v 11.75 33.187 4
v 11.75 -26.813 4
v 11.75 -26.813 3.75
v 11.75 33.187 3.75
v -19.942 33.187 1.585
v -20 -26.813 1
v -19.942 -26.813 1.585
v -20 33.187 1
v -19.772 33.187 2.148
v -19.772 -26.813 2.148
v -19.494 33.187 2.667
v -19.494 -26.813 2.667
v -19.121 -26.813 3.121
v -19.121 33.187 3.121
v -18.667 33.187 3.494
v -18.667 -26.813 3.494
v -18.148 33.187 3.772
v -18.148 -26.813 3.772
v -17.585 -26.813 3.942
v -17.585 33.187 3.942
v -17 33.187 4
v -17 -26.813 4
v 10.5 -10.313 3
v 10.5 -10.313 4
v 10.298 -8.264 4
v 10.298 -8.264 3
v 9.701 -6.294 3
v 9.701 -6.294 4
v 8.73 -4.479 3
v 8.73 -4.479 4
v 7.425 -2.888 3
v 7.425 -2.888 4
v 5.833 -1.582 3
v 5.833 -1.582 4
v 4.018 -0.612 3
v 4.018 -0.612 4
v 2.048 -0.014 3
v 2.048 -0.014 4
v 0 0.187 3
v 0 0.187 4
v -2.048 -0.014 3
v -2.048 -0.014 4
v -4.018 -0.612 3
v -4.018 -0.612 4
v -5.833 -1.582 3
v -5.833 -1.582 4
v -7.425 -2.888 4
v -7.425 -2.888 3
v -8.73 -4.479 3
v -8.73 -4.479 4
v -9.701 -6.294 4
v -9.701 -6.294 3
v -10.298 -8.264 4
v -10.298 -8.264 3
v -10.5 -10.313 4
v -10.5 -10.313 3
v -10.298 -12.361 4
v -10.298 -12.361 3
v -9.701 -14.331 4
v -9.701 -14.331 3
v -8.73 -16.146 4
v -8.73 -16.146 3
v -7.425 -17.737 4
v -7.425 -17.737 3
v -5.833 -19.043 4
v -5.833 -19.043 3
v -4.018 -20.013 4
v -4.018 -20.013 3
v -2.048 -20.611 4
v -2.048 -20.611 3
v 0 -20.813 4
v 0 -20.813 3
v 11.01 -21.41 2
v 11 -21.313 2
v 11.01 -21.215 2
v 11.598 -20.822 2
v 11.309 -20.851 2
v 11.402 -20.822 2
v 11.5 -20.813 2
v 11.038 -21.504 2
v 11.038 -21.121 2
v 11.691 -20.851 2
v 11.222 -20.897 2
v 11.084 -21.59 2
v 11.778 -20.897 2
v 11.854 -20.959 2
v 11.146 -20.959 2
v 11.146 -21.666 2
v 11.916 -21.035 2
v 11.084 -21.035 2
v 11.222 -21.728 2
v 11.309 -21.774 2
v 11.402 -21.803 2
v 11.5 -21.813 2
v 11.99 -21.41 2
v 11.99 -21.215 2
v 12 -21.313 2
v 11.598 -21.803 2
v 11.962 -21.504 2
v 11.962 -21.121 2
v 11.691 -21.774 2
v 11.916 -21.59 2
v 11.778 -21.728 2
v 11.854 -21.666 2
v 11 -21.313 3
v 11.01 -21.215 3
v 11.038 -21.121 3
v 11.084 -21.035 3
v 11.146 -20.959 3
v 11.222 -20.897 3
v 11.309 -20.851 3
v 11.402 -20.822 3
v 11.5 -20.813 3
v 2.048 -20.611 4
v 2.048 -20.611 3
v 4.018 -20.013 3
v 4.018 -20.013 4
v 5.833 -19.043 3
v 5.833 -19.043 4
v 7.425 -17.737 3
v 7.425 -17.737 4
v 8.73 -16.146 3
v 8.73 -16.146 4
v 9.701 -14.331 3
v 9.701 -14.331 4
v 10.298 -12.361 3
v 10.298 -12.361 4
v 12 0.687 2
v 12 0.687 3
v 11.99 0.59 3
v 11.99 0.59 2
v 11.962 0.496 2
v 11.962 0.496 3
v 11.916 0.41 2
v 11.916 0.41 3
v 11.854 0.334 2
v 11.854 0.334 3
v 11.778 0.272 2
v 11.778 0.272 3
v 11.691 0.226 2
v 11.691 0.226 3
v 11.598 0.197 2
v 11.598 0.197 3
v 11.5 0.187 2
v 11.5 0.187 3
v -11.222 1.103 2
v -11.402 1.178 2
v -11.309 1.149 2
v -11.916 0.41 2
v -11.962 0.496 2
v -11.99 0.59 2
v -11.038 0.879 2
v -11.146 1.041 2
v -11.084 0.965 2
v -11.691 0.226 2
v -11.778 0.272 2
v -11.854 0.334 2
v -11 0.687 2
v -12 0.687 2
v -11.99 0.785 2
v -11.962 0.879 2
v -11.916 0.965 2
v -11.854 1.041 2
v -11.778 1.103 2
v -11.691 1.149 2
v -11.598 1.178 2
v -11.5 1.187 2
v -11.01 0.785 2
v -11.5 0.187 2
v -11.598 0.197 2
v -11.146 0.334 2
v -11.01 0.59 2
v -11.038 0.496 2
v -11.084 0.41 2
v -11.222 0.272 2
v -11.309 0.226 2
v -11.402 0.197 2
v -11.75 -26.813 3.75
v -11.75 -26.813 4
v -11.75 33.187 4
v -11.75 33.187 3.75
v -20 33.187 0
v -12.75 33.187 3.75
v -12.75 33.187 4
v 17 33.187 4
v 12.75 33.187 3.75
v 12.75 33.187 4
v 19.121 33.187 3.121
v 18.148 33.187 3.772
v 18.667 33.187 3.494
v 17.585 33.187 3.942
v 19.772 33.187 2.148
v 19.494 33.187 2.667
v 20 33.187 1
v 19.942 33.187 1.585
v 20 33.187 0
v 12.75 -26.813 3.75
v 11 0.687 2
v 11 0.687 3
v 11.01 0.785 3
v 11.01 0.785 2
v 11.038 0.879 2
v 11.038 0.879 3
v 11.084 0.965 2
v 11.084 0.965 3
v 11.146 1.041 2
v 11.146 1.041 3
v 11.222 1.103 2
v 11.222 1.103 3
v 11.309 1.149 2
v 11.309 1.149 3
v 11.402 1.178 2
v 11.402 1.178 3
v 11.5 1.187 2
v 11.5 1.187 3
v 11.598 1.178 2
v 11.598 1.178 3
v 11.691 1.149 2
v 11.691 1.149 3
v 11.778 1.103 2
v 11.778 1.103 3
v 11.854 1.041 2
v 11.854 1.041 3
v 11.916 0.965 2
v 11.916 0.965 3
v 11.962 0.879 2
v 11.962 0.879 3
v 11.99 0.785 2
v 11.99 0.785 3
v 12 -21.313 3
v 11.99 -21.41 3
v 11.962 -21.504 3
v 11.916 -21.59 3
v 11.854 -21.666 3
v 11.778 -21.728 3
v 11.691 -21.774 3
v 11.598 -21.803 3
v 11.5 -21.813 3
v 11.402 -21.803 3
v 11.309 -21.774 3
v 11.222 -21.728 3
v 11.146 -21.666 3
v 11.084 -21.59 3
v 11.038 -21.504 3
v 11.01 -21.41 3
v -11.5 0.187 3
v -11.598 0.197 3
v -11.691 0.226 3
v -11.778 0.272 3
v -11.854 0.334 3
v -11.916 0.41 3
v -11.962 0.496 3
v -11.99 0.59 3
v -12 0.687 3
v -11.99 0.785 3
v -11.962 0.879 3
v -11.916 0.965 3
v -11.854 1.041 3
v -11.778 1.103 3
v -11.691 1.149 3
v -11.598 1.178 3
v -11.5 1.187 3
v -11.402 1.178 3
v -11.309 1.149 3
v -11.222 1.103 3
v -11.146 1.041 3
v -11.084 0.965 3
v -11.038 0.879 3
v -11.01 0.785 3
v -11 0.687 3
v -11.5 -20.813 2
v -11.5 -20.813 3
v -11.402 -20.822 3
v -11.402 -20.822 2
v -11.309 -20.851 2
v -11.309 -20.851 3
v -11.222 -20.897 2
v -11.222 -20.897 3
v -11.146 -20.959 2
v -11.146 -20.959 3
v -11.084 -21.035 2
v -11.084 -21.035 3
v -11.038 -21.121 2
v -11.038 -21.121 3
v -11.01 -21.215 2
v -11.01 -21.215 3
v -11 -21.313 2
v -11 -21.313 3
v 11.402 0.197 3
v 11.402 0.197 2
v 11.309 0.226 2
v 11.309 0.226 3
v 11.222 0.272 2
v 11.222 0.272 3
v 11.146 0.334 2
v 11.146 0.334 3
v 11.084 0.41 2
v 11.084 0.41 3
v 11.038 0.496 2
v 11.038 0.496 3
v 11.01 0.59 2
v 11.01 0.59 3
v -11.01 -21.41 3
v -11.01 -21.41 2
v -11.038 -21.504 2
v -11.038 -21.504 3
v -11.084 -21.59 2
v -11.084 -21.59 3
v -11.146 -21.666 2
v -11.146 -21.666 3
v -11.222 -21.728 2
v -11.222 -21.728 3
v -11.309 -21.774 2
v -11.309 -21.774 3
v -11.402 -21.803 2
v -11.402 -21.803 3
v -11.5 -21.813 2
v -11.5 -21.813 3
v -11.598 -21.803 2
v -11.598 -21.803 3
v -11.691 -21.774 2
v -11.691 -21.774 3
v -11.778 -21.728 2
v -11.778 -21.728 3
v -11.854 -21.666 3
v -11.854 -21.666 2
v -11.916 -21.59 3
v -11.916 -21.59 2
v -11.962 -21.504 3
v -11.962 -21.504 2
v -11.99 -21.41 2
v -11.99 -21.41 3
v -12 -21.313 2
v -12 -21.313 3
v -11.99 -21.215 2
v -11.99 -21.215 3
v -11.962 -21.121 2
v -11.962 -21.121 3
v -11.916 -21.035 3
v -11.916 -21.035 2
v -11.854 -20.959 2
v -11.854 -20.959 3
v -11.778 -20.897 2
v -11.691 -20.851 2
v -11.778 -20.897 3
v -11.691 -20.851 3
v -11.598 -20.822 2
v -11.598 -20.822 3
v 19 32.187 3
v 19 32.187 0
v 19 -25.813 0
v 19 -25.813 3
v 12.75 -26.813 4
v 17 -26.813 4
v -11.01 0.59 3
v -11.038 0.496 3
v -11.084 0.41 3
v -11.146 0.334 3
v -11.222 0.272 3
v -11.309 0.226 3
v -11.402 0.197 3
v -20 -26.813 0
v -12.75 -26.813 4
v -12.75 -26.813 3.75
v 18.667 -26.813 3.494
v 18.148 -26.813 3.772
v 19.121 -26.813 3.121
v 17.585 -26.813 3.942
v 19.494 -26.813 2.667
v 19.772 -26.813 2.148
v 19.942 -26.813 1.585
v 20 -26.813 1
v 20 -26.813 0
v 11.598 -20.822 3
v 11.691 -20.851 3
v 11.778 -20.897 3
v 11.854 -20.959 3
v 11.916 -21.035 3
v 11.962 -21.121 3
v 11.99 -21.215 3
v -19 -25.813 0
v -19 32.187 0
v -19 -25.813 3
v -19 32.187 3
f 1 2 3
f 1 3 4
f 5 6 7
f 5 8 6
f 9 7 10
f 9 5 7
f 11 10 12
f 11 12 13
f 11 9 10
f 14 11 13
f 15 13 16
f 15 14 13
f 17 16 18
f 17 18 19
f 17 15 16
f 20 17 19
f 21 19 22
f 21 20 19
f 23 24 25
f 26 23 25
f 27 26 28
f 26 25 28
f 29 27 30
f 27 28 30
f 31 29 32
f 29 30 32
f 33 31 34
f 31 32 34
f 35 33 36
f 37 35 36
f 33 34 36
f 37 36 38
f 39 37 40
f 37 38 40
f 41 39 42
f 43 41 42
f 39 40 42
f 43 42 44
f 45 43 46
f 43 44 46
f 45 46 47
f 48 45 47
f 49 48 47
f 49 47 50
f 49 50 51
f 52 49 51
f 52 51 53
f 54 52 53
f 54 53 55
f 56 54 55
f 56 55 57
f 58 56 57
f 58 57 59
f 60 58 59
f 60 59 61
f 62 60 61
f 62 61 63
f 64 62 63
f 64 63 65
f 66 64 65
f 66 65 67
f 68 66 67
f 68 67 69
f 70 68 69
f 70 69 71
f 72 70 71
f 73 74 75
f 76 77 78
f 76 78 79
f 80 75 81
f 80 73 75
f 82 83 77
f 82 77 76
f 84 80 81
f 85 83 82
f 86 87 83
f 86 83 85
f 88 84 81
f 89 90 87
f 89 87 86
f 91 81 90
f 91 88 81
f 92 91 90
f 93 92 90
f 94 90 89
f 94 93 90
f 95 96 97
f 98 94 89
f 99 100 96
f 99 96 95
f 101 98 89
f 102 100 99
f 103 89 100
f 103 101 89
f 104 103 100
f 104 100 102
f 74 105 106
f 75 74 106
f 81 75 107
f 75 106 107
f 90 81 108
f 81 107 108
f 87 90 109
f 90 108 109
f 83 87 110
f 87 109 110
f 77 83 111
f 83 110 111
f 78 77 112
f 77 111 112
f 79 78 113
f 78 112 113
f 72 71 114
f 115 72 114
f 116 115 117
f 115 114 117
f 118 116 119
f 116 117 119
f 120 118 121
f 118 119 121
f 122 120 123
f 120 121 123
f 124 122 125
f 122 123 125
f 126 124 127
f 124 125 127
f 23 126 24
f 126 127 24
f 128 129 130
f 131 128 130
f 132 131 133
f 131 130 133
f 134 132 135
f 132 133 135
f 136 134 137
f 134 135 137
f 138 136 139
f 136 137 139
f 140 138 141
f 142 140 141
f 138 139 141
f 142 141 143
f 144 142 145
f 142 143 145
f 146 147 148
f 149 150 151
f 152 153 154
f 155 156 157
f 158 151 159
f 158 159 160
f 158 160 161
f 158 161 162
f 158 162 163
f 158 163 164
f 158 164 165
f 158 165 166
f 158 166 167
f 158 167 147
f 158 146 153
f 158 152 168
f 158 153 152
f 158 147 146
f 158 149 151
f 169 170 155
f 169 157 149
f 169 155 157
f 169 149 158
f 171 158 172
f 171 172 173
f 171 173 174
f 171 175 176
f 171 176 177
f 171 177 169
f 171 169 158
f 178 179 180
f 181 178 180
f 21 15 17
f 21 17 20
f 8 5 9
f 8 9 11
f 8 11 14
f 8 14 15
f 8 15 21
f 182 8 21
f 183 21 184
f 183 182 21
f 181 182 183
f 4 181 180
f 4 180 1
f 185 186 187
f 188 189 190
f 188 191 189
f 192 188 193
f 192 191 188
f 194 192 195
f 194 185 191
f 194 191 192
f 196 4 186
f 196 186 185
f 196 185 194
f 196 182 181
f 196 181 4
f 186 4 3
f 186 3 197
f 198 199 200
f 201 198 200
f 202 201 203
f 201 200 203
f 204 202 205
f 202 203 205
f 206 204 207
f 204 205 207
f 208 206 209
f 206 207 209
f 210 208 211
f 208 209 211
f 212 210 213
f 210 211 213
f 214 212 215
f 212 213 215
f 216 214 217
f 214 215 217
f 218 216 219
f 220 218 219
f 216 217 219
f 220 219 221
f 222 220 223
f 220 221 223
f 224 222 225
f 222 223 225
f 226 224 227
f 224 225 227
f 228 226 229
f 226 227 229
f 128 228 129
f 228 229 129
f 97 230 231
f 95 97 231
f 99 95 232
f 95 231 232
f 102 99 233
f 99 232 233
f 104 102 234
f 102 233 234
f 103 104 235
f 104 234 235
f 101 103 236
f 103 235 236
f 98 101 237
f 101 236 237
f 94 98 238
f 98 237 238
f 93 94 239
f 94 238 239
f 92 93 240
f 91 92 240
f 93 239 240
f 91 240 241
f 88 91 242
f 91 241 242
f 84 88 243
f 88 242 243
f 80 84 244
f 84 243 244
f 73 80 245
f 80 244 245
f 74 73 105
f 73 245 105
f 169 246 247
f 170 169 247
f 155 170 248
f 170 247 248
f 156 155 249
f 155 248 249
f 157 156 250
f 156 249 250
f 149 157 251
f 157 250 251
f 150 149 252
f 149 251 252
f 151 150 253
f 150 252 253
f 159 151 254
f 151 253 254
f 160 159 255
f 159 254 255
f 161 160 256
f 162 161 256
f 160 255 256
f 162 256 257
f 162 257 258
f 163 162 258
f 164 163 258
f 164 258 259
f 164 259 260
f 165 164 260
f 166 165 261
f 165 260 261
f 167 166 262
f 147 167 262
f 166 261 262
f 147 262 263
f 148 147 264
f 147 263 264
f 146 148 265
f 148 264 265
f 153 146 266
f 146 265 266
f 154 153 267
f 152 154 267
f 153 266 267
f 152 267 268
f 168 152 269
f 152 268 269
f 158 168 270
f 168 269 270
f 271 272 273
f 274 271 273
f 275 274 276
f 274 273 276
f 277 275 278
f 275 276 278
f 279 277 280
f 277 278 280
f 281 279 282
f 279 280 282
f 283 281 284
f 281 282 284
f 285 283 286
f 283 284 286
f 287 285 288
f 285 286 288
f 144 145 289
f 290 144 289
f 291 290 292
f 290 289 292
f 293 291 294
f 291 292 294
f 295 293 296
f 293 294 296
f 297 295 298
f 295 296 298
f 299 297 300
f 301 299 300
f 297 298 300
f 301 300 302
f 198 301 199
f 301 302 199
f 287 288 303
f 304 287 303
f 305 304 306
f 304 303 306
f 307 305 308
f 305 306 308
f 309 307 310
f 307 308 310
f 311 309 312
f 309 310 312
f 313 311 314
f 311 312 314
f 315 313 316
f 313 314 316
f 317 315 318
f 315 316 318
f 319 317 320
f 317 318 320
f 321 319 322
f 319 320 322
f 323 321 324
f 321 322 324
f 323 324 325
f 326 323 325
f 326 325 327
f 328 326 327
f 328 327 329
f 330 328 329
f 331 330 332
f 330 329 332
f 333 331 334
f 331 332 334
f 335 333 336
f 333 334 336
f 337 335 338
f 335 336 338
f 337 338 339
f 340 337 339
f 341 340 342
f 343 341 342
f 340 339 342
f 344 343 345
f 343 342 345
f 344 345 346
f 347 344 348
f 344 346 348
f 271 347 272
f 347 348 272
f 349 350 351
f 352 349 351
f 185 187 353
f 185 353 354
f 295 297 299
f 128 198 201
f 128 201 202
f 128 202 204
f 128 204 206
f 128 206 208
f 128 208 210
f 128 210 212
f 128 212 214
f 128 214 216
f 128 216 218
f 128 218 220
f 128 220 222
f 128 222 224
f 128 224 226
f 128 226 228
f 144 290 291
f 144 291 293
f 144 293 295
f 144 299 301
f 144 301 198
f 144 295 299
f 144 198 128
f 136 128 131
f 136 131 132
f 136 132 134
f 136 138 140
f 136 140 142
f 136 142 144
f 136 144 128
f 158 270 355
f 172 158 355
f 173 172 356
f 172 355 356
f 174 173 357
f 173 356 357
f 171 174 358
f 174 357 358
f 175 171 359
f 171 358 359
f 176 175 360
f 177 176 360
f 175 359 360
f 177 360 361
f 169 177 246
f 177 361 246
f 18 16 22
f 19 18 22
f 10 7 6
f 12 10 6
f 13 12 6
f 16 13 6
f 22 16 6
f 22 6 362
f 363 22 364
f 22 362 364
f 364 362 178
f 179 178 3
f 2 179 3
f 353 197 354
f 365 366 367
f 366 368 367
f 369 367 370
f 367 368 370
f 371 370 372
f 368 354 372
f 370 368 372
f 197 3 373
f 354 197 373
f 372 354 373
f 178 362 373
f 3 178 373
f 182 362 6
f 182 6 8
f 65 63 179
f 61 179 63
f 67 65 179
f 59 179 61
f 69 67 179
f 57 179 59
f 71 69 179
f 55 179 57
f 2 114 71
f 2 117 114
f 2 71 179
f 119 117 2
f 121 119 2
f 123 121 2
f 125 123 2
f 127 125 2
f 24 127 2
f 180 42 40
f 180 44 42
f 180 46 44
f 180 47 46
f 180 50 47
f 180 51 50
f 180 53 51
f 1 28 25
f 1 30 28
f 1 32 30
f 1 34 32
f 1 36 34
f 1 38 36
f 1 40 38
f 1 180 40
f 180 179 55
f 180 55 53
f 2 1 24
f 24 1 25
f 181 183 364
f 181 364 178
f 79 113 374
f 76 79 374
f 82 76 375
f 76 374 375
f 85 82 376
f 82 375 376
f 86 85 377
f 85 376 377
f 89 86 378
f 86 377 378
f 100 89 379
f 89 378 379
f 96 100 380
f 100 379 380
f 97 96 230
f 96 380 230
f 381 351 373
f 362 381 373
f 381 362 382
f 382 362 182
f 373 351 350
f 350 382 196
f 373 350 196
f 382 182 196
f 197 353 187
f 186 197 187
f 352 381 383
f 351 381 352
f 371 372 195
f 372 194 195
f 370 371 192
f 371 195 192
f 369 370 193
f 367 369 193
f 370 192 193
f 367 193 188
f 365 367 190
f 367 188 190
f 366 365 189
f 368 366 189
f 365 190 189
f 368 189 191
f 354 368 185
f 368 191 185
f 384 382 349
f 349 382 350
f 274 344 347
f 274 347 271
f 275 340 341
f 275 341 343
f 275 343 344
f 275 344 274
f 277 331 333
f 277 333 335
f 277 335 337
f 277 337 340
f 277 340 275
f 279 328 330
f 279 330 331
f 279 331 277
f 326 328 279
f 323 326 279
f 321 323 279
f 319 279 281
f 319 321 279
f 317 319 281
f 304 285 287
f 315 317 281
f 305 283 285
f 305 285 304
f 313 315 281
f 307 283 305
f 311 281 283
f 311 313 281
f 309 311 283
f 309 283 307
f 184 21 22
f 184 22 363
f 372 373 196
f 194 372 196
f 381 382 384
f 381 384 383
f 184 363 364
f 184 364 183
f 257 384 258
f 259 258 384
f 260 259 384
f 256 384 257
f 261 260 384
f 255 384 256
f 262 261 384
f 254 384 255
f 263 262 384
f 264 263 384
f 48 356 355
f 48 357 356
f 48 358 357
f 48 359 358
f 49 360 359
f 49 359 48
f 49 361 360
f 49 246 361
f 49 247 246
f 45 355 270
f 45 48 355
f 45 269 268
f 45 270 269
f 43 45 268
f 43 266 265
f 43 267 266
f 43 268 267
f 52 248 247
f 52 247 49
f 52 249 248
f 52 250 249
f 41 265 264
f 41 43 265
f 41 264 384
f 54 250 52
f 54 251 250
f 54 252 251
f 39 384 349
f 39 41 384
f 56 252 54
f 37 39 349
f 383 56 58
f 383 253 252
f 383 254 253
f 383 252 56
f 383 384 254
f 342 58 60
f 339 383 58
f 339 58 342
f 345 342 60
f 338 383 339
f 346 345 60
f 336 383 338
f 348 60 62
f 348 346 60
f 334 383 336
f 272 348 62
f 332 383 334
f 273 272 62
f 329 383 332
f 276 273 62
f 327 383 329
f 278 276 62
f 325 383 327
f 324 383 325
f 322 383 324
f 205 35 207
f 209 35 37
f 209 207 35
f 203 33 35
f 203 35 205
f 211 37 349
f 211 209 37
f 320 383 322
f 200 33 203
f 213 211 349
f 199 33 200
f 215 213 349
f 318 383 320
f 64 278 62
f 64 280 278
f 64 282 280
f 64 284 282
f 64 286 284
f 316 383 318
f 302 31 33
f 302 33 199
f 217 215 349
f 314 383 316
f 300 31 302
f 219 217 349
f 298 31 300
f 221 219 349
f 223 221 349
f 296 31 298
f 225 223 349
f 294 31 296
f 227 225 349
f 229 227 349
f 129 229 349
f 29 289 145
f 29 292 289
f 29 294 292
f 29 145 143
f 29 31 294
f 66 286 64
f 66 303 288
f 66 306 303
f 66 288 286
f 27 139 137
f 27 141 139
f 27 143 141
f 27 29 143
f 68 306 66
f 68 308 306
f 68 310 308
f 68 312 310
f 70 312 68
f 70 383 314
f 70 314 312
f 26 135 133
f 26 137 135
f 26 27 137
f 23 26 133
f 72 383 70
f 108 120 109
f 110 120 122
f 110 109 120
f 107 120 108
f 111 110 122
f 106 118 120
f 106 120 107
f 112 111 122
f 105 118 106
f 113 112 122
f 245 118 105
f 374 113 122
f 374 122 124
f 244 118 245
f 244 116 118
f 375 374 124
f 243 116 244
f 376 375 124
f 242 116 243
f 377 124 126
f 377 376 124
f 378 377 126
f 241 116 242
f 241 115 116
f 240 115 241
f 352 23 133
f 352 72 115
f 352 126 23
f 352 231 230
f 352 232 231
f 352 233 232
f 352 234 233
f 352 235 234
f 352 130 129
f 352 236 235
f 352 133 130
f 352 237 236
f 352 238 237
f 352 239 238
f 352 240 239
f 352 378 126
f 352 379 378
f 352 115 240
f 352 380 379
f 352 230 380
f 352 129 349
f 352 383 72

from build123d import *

# Parameters (mm, degrees)
F0_W      = 40
F0_H      = 60
F1_DEPTH  = 4
F2_W      = 1
F2_H      = 60
F3_DEPTH  = 0.25
F4_R      = 3
F6_DEPTH  = 25
F7_W      = 37.999998
F7_H      = 57.999999
F8_DEPTH  = 3
F10_DEPTH = 1


with BuildPart() as f1:
    # F0 (on Top) → F1 (new body)
    with BuildSketch(Plane.XY):
        with Locations((0, 3.187494)):
            Rectangle(F0_W, F0_H)
    extrude(amount=F1_DEPTH)

    # F2 (on face) → F3 (cut)
    with BuildSketch(Plane.XY.offset(4)):
        with Locations((-12.25, 3.187494)):
            Rectangle(F2_W, F2_H)
        with Locations((12.25, 3.187494)):
            Rectangle(F2_W, F2_H)
    extrude(amount=-F3_DEPTH, mode=Mode.SUBTRACT)

    # F4
    f4_edges = [f1.edges().sort_by_distance(p)[0] for p in [
        (-20, 3.187494, 4),
        (20, 3.187494, 4),
    ]]
    fillet(f4_edges, radius=F4_R)

    # F5 (on face) → F6 (cut)
    with BuildSketch(Plane.XY.offset(4)):
        with BuildLine():
            ThreePointArc((0, -20.812506), (7.424621, -17.737128), (10.5, -10.312506))
            ThreePointArc((10.5, -10.312506), (-7.424621, -2.887885), (0, -20.812506))
        make_face()
    extrude(amount=-F6_DEPTH, mode=Mode.SUBTRACT)

    # F7 (on face) → F8 (cut)
    with BuildSketch(Plane(origin=(0, 0, 0), x_dir=(1, 0, 0), z_dir=(0, 0, -1))):
        with Locations((0, -3.187493)):
            Rectangle(F7_W, F7_H)
    extrude(amount=-F8_DEPTH, mode=Mode.SUBTRACT)

    # F9 (on face) → F10 (join)
    with BuildSketch(Plane(origin=(0, 0, 3), x_dir=(1, 0, 0), z_dir=(0, 0, -1))):
        with BuildLine():
            Line((11.5, 21.312506), (11, 21.312506))
            ThreePointArc((11, 21.312506), (11.146447, 20.958953), (11.5, 20.812506))
            Line((11.5, 20.812506), (11.5, 21.312506))
        make_face()
        with BuildLine():
            ThreePointArc((12, 21.312506), (11.5, 21.812506), (11, 21.312506))
            Line((11, 21.312506), (11.5, 21.312506))
            Line((11.5, 21.312506), (11.5, 20.812506))
            ThreePointArc((11.5, 20.812506), (11.853553, 20.958953), (12, 21.312506))
        make_face()
        with BuildLine():
            Line((-11.5, 21.312506), (-11, 21.312506))
            ThreePointArc((-11, 21.312506), (-11.853553, 21.66606), (-11.5, 20.812506))
            Line((-11.5, 20.812506), (-11.5, 21.312506))
        make_face()
        with BuildLine():
            ThreePointArc((-11.5, 20.812506), (-11.146447, 20.958953), (-11, 21.312506))
            Line((-11, 21.312506), (-11.5, 21.312506))
            Line((-11.5, 21.312506), (-11.5, 20.812506))
        make_face()
        with BuildLine():
            Line((11.5, -0.687494), (11.5, -0.187494))
            ThreePointArc((11.5, -0.187494), (11.146447, -0.33394), (11, -0.687494))
            Line((11, -0.687494), (11.5, -0.687494))
        make_face()
        with BuildLine():
            ThreePointArc((12, -0.687494), (11.853553, -0.33394), (11.5, -0.187494))
            Line((11.5, -0.187494), (11.5, -0.687494))
            Line((11.5, -0.687494), (11, -0.687494))
            ThreePointArc((11, -0.687494), (11.5, -1.187494), (12, -0.687494))
        make_face()
        with BuildLine():
            ThreePointArc((-11, -0.687494), (-11.146447, -0.33394), (-11.5, -0.187494))
            Line((-11.5, -0.187494), (-11.5, -0.687494))
            Line((-11.5, -0.687494), (-11, -0.687494))
        make_face()
        with BuildLine():
            Line((-11.5, -0.687494), (-11.5, -0.187494))
            ThreePointArc((-11.5, -0.187494), (-11.853553, -1.041047), (-11, -0.687494))
            Line((-11, -0.687494), (-11.5, -0.687494))
        make_face()
    extrude(amount=F10_DEPTH)


solid = f1.part
